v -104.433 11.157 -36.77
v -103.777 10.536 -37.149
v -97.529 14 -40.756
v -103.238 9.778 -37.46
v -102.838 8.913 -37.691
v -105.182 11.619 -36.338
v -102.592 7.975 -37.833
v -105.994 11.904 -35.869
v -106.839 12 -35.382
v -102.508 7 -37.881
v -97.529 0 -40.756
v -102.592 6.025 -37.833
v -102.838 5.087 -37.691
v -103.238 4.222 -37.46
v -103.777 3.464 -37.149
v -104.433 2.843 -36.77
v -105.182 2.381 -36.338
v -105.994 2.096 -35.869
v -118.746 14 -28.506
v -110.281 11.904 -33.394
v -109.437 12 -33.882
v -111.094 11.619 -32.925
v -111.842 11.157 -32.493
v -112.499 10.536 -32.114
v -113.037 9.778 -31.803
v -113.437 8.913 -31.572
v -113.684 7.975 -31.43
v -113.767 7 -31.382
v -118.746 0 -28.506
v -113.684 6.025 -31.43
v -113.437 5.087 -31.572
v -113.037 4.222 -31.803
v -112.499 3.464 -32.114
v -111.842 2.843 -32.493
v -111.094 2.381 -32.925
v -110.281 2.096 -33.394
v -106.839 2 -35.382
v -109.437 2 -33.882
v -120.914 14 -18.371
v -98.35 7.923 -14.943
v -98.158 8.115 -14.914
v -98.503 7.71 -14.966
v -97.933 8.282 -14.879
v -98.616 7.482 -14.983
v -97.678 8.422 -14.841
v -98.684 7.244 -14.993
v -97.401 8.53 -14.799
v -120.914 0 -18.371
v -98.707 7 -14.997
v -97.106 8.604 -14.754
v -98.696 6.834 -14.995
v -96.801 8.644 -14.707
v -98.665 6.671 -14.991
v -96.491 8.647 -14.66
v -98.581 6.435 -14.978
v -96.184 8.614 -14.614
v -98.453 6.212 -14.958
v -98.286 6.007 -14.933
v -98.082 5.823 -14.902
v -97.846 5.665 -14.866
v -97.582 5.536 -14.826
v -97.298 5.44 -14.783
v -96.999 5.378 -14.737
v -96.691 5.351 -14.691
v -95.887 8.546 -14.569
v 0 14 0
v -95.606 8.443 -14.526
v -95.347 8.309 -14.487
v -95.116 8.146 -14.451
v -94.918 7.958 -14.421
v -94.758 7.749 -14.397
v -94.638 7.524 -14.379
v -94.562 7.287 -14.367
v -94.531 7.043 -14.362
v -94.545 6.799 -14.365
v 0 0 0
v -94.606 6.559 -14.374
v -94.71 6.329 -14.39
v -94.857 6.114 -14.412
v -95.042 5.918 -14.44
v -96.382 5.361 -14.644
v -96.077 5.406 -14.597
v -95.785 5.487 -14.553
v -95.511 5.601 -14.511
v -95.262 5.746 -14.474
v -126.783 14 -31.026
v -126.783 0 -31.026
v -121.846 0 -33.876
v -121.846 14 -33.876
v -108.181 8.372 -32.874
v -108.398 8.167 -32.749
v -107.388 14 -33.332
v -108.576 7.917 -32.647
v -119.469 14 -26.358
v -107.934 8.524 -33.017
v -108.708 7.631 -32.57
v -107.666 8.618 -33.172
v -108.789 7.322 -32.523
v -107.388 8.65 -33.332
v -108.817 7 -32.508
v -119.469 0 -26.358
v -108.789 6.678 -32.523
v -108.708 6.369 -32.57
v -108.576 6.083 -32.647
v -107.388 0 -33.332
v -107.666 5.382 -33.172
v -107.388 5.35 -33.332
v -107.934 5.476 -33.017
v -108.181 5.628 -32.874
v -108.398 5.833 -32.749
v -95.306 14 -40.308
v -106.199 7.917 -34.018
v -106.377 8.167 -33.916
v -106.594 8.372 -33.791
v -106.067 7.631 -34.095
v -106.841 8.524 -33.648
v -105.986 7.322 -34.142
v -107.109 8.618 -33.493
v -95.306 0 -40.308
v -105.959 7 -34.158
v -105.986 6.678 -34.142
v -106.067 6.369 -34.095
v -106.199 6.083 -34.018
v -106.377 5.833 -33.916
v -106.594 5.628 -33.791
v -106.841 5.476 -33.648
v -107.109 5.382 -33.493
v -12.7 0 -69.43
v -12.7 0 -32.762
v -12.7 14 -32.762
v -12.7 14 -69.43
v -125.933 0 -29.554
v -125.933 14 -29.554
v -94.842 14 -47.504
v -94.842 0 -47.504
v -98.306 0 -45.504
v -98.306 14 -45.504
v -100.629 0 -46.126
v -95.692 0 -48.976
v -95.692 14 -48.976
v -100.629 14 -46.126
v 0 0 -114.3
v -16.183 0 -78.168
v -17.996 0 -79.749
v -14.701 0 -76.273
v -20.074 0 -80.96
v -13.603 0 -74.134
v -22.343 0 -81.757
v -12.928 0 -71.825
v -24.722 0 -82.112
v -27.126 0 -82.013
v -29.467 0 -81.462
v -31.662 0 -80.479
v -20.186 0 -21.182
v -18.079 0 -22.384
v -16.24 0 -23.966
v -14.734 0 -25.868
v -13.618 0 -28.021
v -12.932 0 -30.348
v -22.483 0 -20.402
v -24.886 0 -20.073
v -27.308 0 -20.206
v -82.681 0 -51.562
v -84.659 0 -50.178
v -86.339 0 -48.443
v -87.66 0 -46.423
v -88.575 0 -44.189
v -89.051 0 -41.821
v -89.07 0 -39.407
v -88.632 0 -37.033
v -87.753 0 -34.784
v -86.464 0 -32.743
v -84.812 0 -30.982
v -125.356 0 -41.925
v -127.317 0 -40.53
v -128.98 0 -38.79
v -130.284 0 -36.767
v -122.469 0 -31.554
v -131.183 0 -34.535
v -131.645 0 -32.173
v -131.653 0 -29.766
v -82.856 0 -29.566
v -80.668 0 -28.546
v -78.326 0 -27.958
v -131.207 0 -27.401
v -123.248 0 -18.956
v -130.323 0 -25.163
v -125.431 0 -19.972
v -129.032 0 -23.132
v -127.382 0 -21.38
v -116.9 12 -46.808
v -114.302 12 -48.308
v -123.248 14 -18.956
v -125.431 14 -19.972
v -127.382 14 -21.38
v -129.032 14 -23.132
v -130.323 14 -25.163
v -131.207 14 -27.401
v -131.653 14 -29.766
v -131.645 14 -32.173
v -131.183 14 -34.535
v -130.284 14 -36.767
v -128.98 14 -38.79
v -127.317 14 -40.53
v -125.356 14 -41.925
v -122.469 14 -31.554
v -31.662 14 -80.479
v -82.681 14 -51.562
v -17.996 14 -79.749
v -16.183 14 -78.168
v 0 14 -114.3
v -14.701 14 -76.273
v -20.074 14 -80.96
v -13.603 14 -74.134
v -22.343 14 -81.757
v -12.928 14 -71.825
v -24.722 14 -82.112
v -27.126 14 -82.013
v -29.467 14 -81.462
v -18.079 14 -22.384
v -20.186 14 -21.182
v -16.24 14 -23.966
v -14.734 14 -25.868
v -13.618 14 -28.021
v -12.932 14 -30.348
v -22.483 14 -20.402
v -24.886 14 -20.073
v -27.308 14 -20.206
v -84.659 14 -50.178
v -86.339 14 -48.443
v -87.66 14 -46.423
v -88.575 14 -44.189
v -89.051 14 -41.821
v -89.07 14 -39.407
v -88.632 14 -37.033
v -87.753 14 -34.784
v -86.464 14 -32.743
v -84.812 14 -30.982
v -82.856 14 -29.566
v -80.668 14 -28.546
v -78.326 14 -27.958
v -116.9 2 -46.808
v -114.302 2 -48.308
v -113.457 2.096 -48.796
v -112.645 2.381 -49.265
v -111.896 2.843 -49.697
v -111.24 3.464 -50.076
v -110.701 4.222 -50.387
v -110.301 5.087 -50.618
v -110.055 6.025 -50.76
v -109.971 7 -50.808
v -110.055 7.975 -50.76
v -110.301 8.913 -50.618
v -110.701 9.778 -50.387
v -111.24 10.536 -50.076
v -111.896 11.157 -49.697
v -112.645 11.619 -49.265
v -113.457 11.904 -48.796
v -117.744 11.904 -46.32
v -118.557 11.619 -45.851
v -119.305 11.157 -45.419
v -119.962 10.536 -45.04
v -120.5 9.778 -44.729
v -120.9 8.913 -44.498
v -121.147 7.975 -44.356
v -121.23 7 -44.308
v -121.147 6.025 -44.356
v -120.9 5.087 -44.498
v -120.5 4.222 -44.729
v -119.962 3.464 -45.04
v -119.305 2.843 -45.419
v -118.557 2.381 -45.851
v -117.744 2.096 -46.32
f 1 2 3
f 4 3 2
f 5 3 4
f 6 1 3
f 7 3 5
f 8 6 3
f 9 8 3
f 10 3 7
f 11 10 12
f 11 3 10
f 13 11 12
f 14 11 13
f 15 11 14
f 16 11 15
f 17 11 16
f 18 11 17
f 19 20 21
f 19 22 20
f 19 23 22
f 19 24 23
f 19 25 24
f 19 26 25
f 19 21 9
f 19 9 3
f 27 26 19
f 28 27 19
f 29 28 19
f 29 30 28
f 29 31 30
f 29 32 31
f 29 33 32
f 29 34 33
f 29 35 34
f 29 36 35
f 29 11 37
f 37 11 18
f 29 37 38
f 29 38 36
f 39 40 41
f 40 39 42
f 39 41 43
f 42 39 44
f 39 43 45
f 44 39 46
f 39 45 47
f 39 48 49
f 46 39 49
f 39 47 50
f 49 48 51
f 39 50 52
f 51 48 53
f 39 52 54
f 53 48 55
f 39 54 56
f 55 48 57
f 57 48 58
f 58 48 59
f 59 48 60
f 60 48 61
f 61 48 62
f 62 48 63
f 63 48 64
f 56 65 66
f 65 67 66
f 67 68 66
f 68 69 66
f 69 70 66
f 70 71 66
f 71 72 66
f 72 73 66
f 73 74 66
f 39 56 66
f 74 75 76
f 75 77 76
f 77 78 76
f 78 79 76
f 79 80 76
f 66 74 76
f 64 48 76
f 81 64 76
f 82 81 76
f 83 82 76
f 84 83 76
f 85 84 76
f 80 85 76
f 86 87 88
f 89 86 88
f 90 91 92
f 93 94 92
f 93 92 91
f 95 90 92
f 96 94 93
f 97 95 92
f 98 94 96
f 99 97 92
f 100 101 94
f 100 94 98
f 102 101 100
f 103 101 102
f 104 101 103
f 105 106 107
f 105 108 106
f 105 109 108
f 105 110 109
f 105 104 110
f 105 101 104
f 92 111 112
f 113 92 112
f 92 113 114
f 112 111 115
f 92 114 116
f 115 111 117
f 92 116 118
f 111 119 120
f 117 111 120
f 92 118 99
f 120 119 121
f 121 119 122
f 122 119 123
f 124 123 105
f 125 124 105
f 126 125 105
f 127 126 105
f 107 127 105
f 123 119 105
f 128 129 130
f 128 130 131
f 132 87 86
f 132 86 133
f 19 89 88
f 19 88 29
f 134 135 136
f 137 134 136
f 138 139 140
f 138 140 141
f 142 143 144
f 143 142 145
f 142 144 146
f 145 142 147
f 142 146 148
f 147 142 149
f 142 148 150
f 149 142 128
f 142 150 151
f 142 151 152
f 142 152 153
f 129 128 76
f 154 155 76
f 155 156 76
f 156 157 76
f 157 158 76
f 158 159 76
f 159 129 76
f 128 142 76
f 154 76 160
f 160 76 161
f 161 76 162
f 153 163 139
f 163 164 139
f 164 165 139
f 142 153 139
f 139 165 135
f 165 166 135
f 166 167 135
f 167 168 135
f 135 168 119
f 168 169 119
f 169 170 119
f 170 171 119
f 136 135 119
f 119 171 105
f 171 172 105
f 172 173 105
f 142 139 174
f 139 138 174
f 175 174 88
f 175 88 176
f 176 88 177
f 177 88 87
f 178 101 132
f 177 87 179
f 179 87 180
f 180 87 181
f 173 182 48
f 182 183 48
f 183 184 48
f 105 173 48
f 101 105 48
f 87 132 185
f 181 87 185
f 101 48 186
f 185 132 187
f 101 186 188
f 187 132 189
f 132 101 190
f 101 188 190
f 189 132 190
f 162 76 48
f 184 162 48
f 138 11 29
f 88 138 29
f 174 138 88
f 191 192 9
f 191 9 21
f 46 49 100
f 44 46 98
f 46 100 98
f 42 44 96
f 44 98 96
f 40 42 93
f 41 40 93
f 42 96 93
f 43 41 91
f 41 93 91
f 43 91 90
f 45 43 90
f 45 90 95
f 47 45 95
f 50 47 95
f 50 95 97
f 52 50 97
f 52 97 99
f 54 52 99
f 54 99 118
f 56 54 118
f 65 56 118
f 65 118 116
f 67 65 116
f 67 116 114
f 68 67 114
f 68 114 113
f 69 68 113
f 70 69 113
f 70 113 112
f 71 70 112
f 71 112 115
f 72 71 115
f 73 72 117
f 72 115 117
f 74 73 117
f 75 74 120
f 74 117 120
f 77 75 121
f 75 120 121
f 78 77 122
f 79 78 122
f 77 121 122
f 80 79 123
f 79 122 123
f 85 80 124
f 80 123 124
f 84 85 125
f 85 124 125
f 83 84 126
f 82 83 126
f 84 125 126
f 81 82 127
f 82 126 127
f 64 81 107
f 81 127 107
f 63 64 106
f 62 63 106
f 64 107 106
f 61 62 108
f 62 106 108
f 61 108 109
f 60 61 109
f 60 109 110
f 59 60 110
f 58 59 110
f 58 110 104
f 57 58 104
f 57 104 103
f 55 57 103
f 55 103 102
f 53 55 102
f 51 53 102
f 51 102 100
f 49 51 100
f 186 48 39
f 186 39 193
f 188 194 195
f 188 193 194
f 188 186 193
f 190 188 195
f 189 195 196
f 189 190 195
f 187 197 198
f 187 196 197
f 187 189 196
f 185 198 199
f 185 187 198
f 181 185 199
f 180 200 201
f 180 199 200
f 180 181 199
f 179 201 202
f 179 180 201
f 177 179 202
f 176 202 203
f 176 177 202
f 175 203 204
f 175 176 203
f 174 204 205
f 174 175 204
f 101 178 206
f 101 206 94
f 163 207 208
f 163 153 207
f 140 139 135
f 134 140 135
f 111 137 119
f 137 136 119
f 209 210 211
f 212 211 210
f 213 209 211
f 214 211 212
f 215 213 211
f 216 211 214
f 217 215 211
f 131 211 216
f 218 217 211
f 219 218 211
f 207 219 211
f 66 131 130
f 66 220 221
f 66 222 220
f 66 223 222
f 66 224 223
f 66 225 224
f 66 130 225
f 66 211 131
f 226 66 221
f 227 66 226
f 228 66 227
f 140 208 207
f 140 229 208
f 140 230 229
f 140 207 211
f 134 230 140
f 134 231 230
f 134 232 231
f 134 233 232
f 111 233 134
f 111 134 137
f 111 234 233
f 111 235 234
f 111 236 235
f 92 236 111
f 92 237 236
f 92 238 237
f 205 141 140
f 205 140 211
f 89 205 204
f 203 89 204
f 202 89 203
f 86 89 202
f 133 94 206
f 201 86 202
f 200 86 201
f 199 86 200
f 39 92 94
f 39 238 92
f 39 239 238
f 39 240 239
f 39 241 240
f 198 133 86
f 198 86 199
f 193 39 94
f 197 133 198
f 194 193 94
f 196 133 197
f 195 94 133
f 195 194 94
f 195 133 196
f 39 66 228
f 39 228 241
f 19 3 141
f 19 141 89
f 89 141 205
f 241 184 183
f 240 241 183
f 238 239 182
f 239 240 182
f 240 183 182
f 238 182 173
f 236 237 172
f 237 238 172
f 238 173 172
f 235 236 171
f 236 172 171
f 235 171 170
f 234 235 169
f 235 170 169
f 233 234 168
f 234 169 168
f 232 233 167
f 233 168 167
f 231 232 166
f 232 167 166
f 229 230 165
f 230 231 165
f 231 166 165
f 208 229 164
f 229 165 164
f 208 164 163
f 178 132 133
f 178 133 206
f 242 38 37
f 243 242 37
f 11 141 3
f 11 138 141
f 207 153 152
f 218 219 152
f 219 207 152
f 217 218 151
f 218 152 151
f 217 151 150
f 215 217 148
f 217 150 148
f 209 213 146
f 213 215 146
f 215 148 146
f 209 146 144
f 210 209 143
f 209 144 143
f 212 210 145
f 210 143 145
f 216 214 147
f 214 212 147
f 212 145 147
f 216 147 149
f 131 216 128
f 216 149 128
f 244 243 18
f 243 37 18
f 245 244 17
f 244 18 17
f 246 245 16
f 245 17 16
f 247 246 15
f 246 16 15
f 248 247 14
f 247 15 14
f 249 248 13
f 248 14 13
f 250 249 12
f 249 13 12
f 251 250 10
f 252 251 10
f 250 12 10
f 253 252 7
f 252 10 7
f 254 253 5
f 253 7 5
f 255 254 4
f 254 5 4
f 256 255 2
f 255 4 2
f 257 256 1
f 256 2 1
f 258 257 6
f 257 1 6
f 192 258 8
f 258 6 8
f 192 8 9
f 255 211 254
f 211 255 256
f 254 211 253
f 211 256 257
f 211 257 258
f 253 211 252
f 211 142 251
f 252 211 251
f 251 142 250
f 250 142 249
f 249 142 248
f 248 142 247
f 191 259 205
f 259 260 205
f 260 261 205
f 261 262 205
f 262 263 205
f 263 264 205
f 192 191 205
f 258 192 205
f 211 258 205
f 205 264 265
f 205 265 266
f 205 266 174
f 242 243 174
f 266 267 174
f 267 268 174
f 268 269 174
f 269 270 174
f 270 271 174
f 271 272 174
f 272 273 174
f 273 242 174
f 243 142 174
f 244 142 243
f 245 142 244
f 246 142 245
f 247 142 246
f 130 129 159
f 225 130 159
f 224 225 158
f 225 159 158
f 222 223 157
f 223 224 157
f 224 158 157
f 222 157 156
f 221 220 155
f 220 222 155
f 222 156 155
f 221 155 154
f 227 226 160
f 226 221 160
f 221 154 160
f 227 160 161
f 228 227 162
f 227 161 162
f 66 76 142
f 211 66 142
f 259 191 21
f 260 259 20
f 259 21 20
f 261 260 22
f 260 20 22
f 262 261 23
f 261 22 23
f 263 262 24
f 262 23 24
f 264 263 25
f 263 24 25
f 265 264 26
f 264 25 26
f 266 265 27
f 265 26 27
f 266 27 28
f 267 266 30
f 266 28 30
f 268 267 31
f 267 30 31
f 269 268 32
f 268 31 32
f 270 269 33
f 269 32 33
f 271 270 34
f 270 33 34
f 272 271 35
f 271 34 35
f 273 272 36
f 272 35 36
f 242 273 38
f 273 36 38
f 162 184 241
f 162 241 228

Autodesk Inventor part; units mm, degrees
ref_plane "YZ Plane" through (0, 0, 0) normal (1, 0, 0) x (0, 1, 0)
ref_plane "XZ Plane" through (0, 0, 0) normal (0, 1, 0) x (-1, 0, 0)
ref_plane "XY Plane" through (0, 0, 0) normal (0, 0, 1) x (1, 0, 0)
sketch "Sketch1" plane through (0, 0, 0) normal (0, 1, 0) x (-1, 0, 0)
  line L0 (0, 0) -> (0, -114.3)
  line L1 (0, -114.3) -> (125.3564, -41.9254)
  line L2 (0, -114.3) -> (144.7491, -114.3) construction
  line L3 (120.9141, -18.371) -> (0, 0)
  arc A0 (125.3564, -41.9254) -> (120.9141, -18.371) centre (119.0064, -30.9269) ccw
  line L4 (12.7, -32.7621) -> (12.7, -69.4305)
  line L5 (0, -114.3) -> (0, -98.425)
  line L6 (31.6623, -80.4792) -> (82.681, -51.5623)
  line L7 (78.3264, -27.9577) -> (27.3077, -20.2062)
  arc A1 (82.681, -51.5623) -> (78.3264, -27.9577) centre (76.4188, -40.5136) ccw
  arc A2 (12.7, -69.4305) -> (31.6623, -80.4792) centre (25.4, -69.4305) ccw
  arc A3 (27.3077, -20.2062) -> (12.7, -32.7621) centre (25.4, -32.7621) ccw
  line L8 (126.7827, -31.0259) -> (121.8464, -33.8759)
  line L9 (121.8464, -33.8759) -> (118.7464, -28.5065)
  line L10 (126.7827, -31.0259) -> (125.9327, -29.5536)
  line L11 (125.9327, -29.5536) -> (122.4686, -31.5536)
  line L12 (122.4686, -31.5536) -> (119.4686, -26.3575)
  line L13 (118.7464, -28.5065) -> (108.1376, -34.6315)
  line L14 (119.4686, -26.3575) -> (107.3876, -33.3325)
  line L15 (95.6924, -48.9759) -> (100.6288, -46.1259)
  line L16 (100.6288, -46.1259) -> (97.5288, -40.7565)
  line L17 (95.6924, -48.9759) -> (94.8424, -47.5036)
  line L18 (94.8424, -47.5036) -> (98.3065, -45.5036)
  line L19 (98.3065, -45.5036) -> (95.3065, -40.3075)
  line L20 (97.5288, -40.7565) -> (108.1376, -34.6315)
  line L21 (95.3065, -40.3075) -> (107.3876, -33.3325)
  point P0 (156.7289, -23.8125)
  dimension "d0" = 114.3
  dimension "d2" = 30
  dimension "d3" = 12.7
  dimension "d5" = 15.875
  dimension "d8" = 12.7
  dimension "d9" = 12.7
  dimension "d34" = 5.7
  dimension "d36" = 6.2
  dimension "d37" = 1.7
  dimension "d38" = 4
  dimension "d39" = 6
  dimension "d41" = 12.25
  dimension "d42" = 13.95
  dimension "d45" = 1.7
  dimension "d46" = 12.25
  dimension "d47" = 13.95
  dimension "d48" = 1.7
  dimension "d49" = 6.2
  dimension "d50" = 5.7
  dimension "d59" = 24.5
extrude "Extrusion2" add sketch "Sketch1" along normal blind 14
sketch "Sketch3" plane through (-97.5288, 0, -40.7565) normal (0.5, 0, 0.866) x (0.866, 0, -0.5)
  line L0 (-13.75, 7) -> (-10.75, 7) construction
  line L1 (-13.75, 2) -> (-10.75, 2)
  line L2 (-10.75, 12) -> (-13.75, 12)
  arc A0 (-13.75, 12) -> (-13.75, 2) centre (-13.75, 7) ccw
  arc A1 (-10.75, 2) -> (-10.75, 12) centre (-10.75, 7) ccw
  line L3 (0, 0) -> (-24.5, 0) projected
  line L4 (-24.5, 0) -> (-24.5, 14) projected
  point P0 (64.0841, 0)
  point P1 (-12.25, 7)
  dimension "d55" = 10
  dimension "d56" = 7
  dimension "d57" = 3
  dimension "d58" = 12.25
extrude "Extrusion3" cut sketch "Sketch3" against normal up to next
sketch "Sketch4" plane through (-125.3564, 0, -41.9254) normal (-0.5, 0, -0.866) x (-0.866, 0, 0.5)
  arc A0 (-9.765, 2) -> (-9.765, 12) centre (-9.765, 7) ccw projected
  arc A1 (-12.765, 12) -> (-12.765, 2) centre (-12.765, 7) ccw projected
  line L0 (-9.765, 12) -> (-12.765, 12)
  line L1 (-9.765, 2) -> (-12.765, 2) projected
  line L2 (-9.765, 12) -> (-12.765, 2)
  line L3 (-9.765, 2) -> (-12.765, 12)
  circle A2 centre (-11.265, 7) radius 1.65
  point P0 (-87.5991, 0)
  dimension "d62" = 3.3
extrude "Extrusion4" cut sketch "Sketch4" against normal up to next contours A2 L2 L3 | L3 L2 A2 | L2 L3 A2 | A2 L3 L2
properties part number "Din_Rail_0.45mm_Clearance"
